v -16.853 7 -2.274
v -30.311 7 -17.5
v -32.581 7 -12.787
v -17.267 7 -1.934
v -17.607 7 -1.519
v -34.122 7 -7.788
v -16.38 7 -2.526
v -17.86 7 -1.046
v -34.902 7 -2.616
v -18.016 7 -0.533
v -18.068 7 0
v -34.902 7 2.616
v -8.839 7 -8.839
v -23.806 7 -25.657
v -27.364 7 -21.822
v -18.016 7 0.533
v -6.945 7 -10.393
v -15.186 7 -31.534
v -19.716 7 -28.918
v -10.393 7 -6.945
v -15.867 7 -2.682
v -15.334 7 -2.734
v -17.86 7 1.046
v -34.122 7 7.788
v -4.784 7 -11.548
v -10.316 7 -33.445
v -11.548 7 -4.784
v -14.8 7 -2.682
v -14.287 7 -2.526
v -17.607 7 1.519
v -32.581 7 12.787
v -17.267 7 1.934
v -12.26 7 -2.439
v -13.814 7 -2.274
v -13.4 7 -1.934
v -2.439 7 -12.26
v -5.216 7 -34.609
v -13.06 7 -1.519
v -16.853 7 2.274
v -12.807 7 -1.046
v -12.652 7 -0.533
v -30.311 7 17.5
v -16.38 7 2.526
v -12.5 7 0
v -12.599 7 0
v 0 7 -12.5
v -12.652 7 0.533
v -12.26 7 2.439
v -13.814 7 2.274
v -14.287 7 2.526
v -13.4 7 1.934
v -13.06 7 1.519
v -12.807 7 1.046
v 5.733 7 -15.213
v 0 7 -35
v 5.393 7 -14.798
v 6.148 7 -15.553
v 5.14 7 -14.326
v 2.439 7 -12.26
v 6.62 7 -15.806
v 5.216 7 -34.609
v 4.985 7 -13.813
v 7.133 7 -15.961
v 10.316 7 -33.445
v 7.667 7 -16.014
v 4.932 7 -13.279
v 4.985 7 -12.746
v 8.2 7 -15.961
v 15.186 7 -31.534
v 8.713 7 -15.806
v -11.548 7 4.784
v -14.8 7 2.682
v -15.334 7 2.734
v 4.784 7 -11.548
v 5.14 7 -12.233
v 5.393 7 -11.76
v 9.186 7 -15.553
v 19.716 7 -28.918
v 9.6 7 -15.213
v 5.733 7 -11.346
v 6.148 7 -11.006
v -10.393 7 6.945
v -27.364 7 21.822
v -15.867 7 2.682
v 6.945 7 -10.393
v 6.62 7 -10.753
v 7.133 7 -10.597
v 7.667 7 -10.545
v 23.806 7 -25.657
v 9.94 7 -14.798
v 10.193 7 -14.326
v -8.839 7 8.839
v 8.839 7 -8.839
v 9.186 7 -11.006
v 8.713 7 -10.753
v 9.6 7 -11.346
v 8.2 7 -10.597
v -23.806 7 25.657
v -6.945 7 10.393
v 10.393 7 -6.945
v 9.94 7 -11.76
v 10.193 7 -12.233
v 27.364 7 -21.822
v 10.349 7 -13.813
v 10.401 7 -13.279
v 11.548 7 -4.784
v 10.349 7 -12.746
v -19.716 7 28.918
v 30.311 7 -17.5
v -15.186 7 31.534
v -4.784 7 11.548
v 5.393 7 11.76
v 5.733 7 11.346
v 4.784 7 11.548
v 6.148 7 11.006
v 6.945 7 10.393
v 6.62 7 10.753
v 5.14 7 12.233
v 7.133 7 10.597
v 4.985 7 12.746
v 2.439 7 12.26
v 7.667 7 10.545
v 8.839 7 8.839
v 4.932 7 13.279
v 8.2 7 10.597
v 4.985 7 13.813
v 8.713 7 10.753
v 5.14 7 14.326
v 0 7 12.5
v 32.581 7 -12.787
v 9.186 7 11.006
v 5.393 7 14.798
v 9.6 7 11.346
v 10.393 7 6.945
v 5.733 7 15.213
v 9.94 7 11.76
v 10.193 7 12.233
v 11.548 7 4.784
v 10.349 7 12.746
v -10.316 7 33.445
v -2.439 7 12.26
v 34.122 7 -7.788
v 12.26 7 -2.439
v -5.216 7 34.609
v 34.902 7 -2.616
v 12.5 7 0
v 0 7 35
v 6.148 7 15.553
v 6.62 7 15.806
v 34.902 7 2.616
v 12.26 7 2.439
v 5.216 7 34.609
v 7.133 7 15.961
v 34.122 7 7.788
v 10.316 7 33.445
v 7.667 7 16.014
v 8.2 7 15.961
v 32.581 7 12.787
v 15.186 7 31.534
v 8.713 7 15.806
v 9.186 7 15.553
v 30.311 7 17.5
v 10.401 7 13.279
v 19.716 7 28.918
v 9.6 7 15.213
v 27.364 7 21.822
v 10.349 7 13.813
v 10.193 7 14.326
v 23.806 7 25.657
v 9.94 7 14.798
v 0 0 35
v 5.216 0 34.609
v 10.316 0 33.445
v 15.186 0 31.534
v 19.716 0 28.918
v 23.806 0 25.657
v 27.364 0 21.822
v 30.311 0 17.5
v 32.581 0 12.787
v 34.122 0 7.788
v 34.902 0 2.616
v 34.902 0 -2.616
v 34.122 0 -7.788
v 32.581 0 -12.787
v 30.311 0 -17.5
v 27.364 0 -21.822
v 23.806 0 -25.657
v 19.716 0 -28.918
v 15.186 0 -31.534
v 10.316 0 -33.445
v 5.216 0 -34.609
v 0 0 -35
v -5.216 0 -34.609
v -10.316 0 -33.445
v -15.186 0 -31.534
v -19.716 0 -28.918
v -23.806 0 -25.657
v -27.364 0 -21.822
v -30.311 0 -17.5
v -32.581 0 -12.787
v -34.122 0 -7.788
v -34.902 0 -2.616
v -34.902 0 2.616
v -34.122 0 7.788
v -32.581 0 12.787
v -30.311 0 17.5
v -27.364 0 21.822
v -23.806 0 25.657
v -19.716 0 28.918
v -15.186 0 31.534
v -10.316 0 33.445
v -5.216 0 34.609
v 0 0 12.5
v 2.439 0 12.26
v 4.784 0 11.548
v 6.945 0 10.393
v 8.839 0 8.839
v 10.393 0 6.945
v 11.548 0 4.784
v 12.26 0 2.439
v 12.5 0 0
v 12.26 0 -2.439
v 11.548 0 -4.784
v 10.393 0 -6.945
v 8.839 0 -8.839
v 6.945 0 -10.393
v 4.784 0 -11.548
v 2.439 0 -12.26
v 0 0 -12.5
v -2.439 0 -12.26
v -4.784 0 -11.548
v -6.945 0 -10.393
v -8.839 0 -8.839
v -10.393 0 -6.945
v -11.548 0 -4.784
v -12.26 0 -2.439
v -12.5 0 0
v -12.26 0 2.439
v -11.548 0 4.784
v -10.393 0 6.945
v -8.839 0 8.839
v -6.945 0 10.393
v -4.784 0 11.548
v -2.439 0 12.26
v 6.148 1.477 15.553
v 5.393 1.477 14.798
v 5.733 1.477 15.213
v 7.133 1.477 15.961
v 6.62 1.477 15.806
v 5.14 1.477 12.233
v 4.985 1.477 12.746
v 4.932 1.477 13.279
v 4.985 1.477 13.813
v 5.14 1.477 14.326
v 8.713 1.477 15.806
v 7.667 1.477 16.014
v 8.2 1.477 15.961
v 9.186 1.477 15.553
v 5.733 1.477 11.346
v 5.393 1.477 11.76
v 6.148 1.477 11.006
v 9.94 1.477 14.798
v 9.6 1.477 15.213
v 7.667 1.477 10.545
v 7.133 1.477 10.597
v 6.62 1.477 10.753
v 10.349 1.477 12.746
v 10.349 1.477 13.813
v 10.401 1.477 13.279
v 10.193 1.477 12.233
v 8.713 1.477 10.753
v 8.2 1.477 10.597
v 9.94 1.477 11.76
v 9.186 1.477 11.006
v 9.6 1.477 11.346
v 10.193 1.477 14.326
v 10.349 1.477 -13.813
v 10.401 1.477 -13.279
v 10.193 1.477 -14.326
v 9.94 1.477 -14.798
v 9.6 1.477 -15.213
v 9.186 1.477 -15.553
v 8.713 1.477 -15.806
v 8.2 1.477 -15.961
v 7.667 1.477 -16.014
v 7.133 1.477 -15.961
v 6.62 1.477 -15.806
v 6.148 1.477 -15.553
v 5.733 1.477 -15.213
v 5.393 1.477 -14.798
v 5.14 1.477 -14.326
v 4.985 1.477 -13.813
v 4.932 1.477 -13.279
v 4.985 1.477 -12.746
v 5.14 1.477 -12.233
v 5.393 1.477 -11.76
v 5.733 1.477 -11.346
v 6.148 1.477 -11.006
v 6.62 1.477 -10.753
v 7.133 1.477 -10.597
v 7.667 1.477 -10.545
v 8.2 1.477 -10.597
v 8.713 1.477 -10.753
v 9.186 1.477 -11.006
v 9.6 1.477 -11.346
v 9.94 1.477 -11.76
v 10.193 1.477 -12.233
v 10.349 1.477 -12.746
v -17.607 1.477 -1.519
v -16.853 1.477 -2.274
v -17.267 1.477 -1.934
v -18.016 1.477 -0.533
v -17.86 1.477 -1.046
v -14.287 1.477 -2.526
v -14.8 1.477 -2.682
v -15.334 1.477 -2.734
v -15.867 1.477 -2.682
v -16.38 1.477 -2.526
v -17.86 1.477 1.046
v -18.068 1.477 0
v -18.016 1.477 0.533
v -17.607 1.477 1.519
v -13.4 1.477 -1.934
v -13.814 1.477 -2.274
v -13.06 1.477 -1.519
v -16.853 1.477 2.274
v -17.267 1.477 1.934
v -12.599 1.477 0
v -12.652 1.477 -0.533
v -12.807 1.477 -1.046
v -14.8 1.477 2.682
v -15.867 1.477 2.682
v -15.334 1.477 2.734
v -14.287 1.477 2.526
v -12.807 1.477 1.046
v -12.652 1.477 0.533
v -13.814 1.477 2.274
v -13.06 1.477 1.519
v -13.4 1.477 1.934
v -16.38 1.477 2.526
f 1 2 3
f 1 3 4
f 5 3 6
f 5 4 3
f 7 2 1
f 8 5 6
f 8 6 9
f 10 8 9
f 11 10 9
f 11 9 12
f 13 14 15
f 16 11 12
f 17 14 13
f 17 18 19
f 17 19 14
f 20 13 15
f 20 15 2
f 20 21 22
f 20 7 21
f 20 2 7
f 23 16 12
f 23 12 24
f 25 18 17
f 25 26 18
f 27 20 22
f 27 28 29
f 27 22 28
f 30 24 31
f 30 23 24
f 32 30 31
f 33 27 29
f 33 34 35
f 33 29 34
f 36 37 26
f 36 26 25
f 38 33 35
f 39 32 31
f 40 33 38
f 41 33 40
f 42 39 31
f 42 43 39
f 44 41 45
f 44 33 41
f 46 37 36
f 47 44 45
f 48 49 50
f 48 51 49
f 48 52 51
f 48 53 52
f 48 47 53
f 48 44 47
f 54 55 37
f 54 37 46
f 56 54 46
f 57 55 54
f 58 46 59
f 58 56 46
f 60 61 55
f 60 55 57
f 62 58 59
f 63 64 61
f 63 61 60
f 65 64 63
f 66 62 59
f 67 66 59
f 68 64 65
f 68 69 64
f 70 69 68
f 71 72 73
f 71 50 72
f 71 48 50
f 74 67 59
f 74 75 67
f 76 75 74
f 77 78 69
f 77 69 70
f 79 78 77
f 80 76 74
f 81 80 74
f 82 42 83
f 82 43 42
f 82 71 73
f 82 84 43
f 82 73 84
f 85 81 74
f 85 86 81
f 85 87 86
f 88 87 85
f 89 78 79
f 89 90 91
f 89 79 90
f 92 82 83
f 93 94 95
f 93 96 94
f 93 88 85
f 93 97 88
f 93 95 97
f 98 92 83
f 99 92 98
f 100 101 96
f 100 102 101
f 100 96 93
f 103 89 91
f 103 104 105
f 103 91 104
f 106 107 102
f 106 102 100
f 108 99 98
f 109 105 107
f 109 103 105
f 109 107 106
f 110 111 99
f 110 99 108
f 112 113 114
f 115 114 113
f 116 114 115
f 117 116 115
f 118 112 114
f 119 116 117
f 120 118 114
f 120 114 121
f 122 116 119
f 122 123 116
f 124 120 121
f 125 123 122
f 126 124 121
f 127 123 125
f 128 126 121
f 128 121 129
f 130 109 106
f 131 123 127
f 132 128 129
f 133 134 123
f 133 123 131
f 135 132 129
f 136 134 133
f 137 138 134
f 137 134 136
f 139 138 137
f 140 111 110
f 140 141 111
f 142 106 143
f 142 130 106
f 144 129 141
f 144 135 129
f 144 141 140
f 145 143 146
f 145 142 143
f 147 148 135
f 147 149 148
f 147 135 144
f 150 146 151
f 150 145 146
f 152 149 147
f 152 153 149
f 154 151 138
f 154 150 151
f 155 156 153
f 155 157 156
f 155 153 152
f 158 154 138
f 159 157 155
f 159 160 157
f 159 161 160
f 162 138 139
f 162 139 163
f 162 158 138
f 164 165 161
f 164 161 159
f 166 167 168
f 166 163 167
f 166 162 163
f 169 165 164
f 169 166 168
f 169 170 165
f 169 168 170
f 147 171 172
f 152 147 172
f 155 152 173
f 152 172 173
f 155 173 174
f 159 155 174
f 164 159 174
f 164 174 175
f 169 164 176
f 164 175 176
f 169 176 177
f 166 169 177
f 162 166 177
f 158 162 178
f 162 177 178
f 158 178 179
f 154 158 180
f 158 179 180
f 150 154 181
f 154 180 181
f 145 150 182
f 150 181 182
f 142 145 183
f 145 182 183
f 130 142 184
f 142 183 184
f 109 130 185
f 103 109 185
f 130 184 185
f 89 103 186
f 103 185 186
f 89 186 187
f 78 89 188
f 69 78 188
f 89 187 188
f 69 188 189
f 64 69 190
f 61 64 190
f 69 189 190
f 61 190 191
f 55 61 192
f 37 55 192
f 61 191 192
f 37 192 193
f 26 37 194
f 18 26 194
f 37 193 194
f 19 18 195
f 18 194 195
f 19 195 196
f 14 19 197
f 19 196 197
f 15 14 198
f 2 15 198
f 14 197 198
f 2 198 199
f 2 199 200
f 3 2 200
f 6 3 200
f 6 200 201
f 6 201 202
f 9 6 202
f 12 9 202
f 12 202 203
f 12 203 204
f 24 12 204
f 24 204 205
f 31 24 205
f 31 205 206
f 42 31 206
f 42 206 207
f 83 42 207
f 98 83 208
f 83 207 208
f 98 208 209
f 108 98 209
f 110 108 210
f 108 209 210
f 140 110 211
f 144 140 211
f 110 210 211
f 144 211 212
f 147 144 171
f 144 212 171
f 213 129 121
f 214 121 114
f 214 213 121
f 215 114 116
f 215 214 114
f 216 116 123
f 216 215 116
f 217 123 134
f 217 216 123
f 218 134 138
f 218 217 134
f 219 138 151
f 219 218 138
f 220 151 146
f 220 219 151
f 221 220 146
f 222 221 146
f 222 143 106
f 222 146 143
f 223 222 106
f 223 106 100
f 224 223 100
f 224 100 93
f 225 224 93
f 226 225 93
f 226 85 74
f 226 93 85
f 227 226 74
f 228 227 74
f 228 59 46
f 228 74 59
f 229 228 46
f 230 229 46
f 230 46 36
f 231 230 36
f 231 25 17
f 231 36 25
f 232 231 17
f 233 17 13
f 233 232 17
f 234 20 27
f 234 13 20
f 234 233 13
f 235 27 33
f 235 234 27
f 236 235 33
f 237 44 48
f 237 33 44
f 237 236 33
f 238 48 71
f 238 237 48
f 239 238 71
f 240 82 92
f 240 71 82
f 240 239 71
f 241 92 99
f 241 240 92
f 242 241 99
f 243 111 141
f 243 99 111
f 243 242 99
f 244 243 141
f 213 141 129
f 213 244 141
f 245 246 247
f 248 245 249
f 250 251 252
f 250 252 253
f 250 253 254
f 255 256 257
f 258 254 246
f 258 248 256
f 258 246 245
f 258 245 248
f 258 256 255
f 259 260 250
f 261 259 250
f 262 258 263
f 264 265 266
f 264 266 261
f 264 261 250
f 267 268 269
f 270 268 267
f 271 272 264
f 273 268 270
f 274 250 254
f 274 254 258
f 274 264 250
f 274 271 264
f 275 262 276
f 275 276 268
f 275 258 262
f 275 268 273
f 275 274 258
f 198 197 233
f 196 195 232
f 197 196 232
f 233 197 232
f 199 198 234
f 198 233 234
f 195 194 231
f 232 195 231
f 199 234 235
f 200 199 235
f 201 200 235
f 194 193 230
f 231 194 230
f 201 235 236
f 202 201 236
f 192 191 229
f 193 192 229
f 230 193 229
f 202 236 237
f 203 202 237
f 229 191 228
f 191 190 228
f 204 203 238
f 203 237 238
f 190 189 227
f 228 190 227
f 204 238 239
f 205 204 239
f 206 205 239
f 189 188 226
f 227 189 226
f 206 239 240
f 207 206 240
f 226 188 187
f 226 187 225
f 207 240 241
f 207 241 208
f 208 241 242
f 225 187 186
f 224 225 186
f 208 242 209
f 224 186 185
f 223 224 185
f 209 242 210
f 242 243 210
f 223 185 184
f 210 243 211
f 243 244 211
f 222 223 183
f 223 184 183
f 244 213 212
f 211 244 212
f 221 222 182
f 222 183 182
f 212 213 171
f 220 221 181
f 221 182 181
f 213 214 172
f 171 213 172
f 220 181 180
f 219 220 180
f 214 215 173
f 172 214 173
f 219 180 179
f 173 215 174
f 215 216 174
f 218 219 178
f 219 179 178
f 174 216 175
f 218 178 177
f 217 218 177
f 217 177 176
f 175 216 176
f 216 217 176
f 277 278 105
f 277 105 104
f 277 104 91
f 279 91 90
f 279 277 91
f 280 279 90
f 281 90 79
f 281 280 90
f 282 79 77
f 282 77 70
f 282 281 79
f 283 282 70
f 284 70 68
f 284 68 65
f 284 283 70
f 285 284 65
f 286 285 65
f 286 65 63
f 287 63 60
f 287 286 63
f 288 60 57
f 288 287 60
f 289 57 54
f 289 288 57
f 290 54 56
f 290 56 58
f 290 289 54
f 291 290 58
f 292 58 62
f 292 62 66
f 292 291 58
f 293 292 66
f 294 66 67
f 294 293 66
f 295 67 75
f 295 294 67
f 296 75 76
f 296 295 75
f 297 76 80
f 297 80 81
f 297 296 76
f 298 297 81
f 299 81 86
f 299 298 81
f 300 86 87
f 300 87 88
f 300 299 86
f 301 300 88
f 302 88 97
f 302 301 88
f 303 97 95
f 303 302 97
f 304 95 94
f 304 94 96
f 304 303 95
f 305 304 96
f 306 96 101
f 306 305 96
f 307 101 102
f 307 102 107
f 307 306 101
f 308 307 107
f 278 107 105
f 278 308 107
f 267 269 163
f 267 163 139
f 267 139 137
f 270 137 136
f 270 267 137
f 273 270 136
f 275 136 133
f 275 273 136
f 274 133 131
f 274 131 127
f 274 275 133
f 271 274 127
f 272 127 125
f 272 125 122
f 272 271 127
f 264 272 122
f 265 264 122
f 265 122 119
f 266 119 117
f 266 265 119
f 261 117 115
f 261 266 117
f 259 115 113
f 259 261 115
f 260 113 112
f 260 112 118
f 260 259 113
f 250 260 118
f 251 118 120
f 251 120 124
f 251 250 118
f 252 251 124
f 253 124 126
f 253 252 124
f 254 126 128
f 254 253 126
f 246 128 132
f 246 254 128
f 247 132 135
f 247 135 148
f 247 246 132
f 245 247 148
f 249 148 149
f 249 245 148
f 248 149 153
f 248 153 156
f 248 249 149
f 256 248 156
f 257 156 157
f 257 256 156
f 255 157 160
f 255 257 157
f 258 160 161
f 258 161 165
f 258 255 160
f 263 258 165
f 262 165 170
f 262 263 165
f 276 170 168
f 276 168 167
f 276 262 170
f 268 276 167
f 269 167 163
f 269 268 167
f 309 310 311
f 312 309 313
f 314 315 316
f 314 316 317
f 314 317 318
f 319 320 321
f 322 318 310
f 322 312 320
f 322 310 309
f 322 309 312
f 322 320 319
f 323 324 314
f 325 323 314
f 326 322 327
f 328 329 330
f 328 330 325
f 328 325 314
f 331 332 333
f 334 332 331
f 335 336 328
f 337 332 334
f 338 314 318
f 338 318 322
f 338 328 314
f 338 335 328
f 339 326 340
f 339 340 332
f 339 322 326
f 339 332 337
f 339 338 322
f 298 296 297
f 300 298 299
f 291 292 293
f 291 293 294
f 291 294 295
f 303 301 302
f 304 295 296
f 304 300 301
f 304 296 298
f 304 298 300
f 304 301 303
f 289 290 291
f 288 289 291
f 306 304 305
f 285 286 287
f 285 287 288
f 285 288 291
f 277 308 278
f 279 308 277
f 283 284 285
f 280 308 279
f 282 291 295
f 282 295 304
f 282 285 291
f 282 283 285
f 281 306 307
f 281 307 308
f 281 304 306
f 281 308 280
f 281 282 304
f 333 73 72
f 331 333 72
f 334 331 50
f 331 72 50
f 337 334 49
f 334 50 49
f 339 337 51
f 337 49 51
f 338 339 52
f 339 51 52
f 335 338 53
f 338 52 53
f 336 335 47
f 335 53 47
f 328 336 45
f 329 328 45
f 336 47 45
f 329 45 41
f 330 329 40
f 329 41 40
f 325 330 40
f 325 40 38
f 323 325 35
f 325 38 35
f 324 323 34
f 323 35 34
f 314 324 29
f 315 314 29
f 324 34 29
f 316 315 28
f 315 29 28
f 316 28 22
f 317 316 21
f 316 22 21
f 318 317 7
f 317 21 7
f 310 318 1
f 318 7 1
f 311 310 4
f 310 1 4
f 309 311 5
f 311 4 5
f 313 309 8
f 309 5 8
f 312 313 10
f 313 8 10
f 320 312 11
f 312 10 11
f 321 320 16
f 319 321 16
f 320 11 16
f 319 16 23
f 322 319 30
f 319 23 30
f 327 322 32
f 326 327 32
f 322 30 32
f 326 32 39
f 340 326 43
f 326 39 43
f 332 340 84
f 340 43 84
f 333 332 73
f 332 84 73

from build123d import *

# Parameters (mm, degrees)
SKETCH1_R           = 35
BOSS_EXTRUDE1_DEPTH = 7
SKETCH2_R           = 12.5
CUT_EXTRUDE1_DEPTH  = 50.989999
SKETCH3_R           = 2.734497858
CUT_EXTRUDE2_DEPTH  = 5.523438113
CIRPATTERN1_COUNT   = 3


with BuildPart() as part:
    # Sketch1 → Boss-Extrude1 (new body)
    with BuildSketch(Plane(origin=(0, 0, 0), x_dir=(1, 0, 0), z_dir=(0, 1, 0))):
        Circle(SKETCH1_R)
    extrude(amount=BOSS_EXTRUDE1_DEPTH)

    # Sketch2 → Cut-Extrude1 (cut, through all)
    with BuildSketch(Plane(origin=(0, 0, 0), x_dir=(1, 0, 0), z_dir=(0, 1, 0))):
        Circle(SKETCH2_R)
    extrude(amount=CUT_EXTRUDE1_DEPTH, mode=Mode.SUBTRACT)

    # Sketch3 → Cut-Extrude2 (cut)
    with BuildSketch(Plane(origin=(0, 7, 0), x_dir=(1, 0, 0), z_dir=(0, 1, 0))):
        with Locations((-15.333559702, 0)):
            Circle(SKETCH3_R)
    cut_extrude2 = extrude(amount=-CUT_EXTRUDE2_DEPTH, mode=Mode.SUBTRACT)

    # CirPattern1: Cut-Extrude2 ×3 about axis
    cirpattern1_axis = Axis((0, 0, 0), (0, 1, 0))
    for i in range(1, CIRPATTERN1_COUNT):
        add(cut_extrude2.rotate(cirpattern1_axis, i * 360 / CIRPATTERN1_COUNT), mode=Mode.SUBTRACT)


solid = part.part
